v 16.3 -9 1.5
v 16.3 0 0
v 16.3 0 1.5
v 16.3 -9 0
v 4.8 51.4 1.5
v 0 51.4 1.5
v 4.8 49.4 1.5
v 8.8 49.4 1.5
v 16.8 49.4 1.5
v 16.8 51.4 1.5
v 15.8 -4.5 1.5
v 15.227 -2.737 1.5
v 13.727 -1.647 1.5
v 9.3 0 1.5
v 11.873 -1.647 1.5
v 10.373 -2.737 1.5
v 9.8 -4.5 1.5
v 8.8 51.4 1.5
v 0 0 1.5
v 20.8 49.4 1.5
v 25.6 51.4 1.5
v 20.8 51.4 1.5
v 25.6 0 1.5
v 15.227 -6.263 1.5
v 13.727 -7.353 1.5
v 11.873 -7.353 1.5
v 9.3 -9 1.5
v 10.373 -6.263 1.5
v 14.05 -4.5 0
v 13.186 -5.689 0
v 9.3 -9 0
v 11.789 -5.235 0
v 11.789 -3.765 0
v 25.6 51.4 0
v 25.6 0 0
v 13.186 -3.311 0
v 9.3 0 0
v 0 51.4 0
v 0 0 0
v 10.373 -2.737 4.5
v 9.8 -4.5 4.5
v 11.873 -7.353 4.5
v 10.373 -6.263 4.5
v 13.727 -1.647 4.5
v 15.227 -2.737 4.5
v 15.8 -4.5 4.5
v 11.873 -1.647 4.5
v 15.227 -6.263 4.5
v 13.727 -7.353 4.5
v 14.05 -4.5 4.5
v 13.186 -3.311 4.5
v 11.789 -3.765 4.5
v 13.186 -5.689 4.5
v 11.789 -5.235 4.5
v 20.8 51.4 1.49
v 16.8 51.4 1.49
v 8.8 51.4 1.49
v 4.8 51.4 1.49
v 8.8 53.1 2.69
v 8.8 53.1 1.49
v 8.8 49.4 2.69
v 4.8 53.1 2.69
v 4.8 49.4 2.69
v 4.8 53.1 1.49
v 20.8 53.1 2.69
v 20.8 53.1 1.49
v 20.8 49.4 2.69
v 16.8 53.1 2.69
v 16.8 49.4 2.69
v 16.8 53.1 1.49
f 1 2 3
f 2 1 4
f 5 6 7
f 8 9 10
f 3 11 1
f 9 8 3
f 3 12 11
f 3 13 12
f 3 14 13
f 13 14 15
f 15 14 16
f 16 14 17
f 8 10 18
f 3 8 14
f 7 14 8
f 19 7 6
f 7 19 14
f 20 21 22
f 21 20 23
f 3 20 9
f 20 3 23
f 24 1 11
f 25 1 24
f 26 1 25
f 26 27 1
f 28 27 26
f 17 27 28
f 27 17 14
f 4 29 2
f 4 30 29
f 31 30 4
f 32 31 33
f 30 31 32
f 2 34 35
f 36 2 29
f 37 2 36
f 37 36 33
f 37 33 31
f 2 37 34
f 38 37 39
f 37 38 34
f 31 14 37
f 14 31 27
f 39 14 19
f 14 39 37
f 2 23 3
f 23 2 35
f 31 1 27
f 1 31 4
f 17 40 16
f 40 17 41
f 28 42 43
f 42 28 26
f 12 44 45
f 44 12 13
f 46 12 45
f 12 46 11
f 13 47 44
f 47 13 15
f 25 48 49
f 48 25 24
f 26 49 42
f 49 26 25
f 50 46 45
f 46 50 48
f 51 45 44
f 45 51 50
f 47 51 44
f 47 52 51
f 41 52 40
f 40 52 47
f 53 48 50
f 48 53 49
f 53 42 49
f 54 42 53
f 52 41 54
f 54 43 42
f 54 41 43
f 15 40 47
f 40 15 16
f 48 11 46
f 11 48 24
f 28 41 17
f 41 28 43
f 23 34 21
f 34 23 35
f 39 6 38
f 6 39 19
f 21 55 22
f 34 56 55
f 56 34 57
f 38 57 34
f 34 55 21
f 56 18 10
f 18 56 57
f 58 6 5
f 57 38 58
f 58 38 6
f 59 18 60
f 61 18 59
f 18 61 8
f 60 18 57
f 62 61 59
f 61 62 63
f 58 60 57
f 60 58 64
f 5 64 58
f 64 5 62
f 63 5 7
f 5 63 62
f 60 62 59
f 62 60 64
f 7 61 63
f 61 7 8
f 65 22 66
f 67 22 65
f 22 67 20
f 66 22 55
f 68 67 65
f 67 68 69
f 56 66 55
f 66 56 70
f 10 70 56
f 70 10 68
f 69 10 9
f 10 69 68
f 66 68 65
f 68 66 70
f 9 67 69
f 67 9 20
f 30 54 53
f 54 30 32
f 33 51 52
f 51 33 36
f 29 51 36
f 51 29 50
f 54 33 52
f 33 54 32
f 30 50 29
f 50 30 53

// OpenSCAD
difference(){
    union(){
        cube([25.6, 51.4, 1.5]);
        translate(v=[25.6/2-7/2, -9, 0]){
            union(){
                cube([7, 9, 1.5]);
                translate([7/2, 9/2, 1.5]){
                        cylinder(r=3, h=3);
                };
            };
        };
        translate([4.8, 51.4-2, 1.49]){
            cube([4, 3.7, 1.2]);
        };
        translate([25.6-4.8-4, 51.4-2, 1.49]){
            cube([4, 3.7, 1.2]);
        };
    };
    translate([25.6/2, -9/2, -1]){
        cylinder(r=2.5/2, h=10);
    };
};
